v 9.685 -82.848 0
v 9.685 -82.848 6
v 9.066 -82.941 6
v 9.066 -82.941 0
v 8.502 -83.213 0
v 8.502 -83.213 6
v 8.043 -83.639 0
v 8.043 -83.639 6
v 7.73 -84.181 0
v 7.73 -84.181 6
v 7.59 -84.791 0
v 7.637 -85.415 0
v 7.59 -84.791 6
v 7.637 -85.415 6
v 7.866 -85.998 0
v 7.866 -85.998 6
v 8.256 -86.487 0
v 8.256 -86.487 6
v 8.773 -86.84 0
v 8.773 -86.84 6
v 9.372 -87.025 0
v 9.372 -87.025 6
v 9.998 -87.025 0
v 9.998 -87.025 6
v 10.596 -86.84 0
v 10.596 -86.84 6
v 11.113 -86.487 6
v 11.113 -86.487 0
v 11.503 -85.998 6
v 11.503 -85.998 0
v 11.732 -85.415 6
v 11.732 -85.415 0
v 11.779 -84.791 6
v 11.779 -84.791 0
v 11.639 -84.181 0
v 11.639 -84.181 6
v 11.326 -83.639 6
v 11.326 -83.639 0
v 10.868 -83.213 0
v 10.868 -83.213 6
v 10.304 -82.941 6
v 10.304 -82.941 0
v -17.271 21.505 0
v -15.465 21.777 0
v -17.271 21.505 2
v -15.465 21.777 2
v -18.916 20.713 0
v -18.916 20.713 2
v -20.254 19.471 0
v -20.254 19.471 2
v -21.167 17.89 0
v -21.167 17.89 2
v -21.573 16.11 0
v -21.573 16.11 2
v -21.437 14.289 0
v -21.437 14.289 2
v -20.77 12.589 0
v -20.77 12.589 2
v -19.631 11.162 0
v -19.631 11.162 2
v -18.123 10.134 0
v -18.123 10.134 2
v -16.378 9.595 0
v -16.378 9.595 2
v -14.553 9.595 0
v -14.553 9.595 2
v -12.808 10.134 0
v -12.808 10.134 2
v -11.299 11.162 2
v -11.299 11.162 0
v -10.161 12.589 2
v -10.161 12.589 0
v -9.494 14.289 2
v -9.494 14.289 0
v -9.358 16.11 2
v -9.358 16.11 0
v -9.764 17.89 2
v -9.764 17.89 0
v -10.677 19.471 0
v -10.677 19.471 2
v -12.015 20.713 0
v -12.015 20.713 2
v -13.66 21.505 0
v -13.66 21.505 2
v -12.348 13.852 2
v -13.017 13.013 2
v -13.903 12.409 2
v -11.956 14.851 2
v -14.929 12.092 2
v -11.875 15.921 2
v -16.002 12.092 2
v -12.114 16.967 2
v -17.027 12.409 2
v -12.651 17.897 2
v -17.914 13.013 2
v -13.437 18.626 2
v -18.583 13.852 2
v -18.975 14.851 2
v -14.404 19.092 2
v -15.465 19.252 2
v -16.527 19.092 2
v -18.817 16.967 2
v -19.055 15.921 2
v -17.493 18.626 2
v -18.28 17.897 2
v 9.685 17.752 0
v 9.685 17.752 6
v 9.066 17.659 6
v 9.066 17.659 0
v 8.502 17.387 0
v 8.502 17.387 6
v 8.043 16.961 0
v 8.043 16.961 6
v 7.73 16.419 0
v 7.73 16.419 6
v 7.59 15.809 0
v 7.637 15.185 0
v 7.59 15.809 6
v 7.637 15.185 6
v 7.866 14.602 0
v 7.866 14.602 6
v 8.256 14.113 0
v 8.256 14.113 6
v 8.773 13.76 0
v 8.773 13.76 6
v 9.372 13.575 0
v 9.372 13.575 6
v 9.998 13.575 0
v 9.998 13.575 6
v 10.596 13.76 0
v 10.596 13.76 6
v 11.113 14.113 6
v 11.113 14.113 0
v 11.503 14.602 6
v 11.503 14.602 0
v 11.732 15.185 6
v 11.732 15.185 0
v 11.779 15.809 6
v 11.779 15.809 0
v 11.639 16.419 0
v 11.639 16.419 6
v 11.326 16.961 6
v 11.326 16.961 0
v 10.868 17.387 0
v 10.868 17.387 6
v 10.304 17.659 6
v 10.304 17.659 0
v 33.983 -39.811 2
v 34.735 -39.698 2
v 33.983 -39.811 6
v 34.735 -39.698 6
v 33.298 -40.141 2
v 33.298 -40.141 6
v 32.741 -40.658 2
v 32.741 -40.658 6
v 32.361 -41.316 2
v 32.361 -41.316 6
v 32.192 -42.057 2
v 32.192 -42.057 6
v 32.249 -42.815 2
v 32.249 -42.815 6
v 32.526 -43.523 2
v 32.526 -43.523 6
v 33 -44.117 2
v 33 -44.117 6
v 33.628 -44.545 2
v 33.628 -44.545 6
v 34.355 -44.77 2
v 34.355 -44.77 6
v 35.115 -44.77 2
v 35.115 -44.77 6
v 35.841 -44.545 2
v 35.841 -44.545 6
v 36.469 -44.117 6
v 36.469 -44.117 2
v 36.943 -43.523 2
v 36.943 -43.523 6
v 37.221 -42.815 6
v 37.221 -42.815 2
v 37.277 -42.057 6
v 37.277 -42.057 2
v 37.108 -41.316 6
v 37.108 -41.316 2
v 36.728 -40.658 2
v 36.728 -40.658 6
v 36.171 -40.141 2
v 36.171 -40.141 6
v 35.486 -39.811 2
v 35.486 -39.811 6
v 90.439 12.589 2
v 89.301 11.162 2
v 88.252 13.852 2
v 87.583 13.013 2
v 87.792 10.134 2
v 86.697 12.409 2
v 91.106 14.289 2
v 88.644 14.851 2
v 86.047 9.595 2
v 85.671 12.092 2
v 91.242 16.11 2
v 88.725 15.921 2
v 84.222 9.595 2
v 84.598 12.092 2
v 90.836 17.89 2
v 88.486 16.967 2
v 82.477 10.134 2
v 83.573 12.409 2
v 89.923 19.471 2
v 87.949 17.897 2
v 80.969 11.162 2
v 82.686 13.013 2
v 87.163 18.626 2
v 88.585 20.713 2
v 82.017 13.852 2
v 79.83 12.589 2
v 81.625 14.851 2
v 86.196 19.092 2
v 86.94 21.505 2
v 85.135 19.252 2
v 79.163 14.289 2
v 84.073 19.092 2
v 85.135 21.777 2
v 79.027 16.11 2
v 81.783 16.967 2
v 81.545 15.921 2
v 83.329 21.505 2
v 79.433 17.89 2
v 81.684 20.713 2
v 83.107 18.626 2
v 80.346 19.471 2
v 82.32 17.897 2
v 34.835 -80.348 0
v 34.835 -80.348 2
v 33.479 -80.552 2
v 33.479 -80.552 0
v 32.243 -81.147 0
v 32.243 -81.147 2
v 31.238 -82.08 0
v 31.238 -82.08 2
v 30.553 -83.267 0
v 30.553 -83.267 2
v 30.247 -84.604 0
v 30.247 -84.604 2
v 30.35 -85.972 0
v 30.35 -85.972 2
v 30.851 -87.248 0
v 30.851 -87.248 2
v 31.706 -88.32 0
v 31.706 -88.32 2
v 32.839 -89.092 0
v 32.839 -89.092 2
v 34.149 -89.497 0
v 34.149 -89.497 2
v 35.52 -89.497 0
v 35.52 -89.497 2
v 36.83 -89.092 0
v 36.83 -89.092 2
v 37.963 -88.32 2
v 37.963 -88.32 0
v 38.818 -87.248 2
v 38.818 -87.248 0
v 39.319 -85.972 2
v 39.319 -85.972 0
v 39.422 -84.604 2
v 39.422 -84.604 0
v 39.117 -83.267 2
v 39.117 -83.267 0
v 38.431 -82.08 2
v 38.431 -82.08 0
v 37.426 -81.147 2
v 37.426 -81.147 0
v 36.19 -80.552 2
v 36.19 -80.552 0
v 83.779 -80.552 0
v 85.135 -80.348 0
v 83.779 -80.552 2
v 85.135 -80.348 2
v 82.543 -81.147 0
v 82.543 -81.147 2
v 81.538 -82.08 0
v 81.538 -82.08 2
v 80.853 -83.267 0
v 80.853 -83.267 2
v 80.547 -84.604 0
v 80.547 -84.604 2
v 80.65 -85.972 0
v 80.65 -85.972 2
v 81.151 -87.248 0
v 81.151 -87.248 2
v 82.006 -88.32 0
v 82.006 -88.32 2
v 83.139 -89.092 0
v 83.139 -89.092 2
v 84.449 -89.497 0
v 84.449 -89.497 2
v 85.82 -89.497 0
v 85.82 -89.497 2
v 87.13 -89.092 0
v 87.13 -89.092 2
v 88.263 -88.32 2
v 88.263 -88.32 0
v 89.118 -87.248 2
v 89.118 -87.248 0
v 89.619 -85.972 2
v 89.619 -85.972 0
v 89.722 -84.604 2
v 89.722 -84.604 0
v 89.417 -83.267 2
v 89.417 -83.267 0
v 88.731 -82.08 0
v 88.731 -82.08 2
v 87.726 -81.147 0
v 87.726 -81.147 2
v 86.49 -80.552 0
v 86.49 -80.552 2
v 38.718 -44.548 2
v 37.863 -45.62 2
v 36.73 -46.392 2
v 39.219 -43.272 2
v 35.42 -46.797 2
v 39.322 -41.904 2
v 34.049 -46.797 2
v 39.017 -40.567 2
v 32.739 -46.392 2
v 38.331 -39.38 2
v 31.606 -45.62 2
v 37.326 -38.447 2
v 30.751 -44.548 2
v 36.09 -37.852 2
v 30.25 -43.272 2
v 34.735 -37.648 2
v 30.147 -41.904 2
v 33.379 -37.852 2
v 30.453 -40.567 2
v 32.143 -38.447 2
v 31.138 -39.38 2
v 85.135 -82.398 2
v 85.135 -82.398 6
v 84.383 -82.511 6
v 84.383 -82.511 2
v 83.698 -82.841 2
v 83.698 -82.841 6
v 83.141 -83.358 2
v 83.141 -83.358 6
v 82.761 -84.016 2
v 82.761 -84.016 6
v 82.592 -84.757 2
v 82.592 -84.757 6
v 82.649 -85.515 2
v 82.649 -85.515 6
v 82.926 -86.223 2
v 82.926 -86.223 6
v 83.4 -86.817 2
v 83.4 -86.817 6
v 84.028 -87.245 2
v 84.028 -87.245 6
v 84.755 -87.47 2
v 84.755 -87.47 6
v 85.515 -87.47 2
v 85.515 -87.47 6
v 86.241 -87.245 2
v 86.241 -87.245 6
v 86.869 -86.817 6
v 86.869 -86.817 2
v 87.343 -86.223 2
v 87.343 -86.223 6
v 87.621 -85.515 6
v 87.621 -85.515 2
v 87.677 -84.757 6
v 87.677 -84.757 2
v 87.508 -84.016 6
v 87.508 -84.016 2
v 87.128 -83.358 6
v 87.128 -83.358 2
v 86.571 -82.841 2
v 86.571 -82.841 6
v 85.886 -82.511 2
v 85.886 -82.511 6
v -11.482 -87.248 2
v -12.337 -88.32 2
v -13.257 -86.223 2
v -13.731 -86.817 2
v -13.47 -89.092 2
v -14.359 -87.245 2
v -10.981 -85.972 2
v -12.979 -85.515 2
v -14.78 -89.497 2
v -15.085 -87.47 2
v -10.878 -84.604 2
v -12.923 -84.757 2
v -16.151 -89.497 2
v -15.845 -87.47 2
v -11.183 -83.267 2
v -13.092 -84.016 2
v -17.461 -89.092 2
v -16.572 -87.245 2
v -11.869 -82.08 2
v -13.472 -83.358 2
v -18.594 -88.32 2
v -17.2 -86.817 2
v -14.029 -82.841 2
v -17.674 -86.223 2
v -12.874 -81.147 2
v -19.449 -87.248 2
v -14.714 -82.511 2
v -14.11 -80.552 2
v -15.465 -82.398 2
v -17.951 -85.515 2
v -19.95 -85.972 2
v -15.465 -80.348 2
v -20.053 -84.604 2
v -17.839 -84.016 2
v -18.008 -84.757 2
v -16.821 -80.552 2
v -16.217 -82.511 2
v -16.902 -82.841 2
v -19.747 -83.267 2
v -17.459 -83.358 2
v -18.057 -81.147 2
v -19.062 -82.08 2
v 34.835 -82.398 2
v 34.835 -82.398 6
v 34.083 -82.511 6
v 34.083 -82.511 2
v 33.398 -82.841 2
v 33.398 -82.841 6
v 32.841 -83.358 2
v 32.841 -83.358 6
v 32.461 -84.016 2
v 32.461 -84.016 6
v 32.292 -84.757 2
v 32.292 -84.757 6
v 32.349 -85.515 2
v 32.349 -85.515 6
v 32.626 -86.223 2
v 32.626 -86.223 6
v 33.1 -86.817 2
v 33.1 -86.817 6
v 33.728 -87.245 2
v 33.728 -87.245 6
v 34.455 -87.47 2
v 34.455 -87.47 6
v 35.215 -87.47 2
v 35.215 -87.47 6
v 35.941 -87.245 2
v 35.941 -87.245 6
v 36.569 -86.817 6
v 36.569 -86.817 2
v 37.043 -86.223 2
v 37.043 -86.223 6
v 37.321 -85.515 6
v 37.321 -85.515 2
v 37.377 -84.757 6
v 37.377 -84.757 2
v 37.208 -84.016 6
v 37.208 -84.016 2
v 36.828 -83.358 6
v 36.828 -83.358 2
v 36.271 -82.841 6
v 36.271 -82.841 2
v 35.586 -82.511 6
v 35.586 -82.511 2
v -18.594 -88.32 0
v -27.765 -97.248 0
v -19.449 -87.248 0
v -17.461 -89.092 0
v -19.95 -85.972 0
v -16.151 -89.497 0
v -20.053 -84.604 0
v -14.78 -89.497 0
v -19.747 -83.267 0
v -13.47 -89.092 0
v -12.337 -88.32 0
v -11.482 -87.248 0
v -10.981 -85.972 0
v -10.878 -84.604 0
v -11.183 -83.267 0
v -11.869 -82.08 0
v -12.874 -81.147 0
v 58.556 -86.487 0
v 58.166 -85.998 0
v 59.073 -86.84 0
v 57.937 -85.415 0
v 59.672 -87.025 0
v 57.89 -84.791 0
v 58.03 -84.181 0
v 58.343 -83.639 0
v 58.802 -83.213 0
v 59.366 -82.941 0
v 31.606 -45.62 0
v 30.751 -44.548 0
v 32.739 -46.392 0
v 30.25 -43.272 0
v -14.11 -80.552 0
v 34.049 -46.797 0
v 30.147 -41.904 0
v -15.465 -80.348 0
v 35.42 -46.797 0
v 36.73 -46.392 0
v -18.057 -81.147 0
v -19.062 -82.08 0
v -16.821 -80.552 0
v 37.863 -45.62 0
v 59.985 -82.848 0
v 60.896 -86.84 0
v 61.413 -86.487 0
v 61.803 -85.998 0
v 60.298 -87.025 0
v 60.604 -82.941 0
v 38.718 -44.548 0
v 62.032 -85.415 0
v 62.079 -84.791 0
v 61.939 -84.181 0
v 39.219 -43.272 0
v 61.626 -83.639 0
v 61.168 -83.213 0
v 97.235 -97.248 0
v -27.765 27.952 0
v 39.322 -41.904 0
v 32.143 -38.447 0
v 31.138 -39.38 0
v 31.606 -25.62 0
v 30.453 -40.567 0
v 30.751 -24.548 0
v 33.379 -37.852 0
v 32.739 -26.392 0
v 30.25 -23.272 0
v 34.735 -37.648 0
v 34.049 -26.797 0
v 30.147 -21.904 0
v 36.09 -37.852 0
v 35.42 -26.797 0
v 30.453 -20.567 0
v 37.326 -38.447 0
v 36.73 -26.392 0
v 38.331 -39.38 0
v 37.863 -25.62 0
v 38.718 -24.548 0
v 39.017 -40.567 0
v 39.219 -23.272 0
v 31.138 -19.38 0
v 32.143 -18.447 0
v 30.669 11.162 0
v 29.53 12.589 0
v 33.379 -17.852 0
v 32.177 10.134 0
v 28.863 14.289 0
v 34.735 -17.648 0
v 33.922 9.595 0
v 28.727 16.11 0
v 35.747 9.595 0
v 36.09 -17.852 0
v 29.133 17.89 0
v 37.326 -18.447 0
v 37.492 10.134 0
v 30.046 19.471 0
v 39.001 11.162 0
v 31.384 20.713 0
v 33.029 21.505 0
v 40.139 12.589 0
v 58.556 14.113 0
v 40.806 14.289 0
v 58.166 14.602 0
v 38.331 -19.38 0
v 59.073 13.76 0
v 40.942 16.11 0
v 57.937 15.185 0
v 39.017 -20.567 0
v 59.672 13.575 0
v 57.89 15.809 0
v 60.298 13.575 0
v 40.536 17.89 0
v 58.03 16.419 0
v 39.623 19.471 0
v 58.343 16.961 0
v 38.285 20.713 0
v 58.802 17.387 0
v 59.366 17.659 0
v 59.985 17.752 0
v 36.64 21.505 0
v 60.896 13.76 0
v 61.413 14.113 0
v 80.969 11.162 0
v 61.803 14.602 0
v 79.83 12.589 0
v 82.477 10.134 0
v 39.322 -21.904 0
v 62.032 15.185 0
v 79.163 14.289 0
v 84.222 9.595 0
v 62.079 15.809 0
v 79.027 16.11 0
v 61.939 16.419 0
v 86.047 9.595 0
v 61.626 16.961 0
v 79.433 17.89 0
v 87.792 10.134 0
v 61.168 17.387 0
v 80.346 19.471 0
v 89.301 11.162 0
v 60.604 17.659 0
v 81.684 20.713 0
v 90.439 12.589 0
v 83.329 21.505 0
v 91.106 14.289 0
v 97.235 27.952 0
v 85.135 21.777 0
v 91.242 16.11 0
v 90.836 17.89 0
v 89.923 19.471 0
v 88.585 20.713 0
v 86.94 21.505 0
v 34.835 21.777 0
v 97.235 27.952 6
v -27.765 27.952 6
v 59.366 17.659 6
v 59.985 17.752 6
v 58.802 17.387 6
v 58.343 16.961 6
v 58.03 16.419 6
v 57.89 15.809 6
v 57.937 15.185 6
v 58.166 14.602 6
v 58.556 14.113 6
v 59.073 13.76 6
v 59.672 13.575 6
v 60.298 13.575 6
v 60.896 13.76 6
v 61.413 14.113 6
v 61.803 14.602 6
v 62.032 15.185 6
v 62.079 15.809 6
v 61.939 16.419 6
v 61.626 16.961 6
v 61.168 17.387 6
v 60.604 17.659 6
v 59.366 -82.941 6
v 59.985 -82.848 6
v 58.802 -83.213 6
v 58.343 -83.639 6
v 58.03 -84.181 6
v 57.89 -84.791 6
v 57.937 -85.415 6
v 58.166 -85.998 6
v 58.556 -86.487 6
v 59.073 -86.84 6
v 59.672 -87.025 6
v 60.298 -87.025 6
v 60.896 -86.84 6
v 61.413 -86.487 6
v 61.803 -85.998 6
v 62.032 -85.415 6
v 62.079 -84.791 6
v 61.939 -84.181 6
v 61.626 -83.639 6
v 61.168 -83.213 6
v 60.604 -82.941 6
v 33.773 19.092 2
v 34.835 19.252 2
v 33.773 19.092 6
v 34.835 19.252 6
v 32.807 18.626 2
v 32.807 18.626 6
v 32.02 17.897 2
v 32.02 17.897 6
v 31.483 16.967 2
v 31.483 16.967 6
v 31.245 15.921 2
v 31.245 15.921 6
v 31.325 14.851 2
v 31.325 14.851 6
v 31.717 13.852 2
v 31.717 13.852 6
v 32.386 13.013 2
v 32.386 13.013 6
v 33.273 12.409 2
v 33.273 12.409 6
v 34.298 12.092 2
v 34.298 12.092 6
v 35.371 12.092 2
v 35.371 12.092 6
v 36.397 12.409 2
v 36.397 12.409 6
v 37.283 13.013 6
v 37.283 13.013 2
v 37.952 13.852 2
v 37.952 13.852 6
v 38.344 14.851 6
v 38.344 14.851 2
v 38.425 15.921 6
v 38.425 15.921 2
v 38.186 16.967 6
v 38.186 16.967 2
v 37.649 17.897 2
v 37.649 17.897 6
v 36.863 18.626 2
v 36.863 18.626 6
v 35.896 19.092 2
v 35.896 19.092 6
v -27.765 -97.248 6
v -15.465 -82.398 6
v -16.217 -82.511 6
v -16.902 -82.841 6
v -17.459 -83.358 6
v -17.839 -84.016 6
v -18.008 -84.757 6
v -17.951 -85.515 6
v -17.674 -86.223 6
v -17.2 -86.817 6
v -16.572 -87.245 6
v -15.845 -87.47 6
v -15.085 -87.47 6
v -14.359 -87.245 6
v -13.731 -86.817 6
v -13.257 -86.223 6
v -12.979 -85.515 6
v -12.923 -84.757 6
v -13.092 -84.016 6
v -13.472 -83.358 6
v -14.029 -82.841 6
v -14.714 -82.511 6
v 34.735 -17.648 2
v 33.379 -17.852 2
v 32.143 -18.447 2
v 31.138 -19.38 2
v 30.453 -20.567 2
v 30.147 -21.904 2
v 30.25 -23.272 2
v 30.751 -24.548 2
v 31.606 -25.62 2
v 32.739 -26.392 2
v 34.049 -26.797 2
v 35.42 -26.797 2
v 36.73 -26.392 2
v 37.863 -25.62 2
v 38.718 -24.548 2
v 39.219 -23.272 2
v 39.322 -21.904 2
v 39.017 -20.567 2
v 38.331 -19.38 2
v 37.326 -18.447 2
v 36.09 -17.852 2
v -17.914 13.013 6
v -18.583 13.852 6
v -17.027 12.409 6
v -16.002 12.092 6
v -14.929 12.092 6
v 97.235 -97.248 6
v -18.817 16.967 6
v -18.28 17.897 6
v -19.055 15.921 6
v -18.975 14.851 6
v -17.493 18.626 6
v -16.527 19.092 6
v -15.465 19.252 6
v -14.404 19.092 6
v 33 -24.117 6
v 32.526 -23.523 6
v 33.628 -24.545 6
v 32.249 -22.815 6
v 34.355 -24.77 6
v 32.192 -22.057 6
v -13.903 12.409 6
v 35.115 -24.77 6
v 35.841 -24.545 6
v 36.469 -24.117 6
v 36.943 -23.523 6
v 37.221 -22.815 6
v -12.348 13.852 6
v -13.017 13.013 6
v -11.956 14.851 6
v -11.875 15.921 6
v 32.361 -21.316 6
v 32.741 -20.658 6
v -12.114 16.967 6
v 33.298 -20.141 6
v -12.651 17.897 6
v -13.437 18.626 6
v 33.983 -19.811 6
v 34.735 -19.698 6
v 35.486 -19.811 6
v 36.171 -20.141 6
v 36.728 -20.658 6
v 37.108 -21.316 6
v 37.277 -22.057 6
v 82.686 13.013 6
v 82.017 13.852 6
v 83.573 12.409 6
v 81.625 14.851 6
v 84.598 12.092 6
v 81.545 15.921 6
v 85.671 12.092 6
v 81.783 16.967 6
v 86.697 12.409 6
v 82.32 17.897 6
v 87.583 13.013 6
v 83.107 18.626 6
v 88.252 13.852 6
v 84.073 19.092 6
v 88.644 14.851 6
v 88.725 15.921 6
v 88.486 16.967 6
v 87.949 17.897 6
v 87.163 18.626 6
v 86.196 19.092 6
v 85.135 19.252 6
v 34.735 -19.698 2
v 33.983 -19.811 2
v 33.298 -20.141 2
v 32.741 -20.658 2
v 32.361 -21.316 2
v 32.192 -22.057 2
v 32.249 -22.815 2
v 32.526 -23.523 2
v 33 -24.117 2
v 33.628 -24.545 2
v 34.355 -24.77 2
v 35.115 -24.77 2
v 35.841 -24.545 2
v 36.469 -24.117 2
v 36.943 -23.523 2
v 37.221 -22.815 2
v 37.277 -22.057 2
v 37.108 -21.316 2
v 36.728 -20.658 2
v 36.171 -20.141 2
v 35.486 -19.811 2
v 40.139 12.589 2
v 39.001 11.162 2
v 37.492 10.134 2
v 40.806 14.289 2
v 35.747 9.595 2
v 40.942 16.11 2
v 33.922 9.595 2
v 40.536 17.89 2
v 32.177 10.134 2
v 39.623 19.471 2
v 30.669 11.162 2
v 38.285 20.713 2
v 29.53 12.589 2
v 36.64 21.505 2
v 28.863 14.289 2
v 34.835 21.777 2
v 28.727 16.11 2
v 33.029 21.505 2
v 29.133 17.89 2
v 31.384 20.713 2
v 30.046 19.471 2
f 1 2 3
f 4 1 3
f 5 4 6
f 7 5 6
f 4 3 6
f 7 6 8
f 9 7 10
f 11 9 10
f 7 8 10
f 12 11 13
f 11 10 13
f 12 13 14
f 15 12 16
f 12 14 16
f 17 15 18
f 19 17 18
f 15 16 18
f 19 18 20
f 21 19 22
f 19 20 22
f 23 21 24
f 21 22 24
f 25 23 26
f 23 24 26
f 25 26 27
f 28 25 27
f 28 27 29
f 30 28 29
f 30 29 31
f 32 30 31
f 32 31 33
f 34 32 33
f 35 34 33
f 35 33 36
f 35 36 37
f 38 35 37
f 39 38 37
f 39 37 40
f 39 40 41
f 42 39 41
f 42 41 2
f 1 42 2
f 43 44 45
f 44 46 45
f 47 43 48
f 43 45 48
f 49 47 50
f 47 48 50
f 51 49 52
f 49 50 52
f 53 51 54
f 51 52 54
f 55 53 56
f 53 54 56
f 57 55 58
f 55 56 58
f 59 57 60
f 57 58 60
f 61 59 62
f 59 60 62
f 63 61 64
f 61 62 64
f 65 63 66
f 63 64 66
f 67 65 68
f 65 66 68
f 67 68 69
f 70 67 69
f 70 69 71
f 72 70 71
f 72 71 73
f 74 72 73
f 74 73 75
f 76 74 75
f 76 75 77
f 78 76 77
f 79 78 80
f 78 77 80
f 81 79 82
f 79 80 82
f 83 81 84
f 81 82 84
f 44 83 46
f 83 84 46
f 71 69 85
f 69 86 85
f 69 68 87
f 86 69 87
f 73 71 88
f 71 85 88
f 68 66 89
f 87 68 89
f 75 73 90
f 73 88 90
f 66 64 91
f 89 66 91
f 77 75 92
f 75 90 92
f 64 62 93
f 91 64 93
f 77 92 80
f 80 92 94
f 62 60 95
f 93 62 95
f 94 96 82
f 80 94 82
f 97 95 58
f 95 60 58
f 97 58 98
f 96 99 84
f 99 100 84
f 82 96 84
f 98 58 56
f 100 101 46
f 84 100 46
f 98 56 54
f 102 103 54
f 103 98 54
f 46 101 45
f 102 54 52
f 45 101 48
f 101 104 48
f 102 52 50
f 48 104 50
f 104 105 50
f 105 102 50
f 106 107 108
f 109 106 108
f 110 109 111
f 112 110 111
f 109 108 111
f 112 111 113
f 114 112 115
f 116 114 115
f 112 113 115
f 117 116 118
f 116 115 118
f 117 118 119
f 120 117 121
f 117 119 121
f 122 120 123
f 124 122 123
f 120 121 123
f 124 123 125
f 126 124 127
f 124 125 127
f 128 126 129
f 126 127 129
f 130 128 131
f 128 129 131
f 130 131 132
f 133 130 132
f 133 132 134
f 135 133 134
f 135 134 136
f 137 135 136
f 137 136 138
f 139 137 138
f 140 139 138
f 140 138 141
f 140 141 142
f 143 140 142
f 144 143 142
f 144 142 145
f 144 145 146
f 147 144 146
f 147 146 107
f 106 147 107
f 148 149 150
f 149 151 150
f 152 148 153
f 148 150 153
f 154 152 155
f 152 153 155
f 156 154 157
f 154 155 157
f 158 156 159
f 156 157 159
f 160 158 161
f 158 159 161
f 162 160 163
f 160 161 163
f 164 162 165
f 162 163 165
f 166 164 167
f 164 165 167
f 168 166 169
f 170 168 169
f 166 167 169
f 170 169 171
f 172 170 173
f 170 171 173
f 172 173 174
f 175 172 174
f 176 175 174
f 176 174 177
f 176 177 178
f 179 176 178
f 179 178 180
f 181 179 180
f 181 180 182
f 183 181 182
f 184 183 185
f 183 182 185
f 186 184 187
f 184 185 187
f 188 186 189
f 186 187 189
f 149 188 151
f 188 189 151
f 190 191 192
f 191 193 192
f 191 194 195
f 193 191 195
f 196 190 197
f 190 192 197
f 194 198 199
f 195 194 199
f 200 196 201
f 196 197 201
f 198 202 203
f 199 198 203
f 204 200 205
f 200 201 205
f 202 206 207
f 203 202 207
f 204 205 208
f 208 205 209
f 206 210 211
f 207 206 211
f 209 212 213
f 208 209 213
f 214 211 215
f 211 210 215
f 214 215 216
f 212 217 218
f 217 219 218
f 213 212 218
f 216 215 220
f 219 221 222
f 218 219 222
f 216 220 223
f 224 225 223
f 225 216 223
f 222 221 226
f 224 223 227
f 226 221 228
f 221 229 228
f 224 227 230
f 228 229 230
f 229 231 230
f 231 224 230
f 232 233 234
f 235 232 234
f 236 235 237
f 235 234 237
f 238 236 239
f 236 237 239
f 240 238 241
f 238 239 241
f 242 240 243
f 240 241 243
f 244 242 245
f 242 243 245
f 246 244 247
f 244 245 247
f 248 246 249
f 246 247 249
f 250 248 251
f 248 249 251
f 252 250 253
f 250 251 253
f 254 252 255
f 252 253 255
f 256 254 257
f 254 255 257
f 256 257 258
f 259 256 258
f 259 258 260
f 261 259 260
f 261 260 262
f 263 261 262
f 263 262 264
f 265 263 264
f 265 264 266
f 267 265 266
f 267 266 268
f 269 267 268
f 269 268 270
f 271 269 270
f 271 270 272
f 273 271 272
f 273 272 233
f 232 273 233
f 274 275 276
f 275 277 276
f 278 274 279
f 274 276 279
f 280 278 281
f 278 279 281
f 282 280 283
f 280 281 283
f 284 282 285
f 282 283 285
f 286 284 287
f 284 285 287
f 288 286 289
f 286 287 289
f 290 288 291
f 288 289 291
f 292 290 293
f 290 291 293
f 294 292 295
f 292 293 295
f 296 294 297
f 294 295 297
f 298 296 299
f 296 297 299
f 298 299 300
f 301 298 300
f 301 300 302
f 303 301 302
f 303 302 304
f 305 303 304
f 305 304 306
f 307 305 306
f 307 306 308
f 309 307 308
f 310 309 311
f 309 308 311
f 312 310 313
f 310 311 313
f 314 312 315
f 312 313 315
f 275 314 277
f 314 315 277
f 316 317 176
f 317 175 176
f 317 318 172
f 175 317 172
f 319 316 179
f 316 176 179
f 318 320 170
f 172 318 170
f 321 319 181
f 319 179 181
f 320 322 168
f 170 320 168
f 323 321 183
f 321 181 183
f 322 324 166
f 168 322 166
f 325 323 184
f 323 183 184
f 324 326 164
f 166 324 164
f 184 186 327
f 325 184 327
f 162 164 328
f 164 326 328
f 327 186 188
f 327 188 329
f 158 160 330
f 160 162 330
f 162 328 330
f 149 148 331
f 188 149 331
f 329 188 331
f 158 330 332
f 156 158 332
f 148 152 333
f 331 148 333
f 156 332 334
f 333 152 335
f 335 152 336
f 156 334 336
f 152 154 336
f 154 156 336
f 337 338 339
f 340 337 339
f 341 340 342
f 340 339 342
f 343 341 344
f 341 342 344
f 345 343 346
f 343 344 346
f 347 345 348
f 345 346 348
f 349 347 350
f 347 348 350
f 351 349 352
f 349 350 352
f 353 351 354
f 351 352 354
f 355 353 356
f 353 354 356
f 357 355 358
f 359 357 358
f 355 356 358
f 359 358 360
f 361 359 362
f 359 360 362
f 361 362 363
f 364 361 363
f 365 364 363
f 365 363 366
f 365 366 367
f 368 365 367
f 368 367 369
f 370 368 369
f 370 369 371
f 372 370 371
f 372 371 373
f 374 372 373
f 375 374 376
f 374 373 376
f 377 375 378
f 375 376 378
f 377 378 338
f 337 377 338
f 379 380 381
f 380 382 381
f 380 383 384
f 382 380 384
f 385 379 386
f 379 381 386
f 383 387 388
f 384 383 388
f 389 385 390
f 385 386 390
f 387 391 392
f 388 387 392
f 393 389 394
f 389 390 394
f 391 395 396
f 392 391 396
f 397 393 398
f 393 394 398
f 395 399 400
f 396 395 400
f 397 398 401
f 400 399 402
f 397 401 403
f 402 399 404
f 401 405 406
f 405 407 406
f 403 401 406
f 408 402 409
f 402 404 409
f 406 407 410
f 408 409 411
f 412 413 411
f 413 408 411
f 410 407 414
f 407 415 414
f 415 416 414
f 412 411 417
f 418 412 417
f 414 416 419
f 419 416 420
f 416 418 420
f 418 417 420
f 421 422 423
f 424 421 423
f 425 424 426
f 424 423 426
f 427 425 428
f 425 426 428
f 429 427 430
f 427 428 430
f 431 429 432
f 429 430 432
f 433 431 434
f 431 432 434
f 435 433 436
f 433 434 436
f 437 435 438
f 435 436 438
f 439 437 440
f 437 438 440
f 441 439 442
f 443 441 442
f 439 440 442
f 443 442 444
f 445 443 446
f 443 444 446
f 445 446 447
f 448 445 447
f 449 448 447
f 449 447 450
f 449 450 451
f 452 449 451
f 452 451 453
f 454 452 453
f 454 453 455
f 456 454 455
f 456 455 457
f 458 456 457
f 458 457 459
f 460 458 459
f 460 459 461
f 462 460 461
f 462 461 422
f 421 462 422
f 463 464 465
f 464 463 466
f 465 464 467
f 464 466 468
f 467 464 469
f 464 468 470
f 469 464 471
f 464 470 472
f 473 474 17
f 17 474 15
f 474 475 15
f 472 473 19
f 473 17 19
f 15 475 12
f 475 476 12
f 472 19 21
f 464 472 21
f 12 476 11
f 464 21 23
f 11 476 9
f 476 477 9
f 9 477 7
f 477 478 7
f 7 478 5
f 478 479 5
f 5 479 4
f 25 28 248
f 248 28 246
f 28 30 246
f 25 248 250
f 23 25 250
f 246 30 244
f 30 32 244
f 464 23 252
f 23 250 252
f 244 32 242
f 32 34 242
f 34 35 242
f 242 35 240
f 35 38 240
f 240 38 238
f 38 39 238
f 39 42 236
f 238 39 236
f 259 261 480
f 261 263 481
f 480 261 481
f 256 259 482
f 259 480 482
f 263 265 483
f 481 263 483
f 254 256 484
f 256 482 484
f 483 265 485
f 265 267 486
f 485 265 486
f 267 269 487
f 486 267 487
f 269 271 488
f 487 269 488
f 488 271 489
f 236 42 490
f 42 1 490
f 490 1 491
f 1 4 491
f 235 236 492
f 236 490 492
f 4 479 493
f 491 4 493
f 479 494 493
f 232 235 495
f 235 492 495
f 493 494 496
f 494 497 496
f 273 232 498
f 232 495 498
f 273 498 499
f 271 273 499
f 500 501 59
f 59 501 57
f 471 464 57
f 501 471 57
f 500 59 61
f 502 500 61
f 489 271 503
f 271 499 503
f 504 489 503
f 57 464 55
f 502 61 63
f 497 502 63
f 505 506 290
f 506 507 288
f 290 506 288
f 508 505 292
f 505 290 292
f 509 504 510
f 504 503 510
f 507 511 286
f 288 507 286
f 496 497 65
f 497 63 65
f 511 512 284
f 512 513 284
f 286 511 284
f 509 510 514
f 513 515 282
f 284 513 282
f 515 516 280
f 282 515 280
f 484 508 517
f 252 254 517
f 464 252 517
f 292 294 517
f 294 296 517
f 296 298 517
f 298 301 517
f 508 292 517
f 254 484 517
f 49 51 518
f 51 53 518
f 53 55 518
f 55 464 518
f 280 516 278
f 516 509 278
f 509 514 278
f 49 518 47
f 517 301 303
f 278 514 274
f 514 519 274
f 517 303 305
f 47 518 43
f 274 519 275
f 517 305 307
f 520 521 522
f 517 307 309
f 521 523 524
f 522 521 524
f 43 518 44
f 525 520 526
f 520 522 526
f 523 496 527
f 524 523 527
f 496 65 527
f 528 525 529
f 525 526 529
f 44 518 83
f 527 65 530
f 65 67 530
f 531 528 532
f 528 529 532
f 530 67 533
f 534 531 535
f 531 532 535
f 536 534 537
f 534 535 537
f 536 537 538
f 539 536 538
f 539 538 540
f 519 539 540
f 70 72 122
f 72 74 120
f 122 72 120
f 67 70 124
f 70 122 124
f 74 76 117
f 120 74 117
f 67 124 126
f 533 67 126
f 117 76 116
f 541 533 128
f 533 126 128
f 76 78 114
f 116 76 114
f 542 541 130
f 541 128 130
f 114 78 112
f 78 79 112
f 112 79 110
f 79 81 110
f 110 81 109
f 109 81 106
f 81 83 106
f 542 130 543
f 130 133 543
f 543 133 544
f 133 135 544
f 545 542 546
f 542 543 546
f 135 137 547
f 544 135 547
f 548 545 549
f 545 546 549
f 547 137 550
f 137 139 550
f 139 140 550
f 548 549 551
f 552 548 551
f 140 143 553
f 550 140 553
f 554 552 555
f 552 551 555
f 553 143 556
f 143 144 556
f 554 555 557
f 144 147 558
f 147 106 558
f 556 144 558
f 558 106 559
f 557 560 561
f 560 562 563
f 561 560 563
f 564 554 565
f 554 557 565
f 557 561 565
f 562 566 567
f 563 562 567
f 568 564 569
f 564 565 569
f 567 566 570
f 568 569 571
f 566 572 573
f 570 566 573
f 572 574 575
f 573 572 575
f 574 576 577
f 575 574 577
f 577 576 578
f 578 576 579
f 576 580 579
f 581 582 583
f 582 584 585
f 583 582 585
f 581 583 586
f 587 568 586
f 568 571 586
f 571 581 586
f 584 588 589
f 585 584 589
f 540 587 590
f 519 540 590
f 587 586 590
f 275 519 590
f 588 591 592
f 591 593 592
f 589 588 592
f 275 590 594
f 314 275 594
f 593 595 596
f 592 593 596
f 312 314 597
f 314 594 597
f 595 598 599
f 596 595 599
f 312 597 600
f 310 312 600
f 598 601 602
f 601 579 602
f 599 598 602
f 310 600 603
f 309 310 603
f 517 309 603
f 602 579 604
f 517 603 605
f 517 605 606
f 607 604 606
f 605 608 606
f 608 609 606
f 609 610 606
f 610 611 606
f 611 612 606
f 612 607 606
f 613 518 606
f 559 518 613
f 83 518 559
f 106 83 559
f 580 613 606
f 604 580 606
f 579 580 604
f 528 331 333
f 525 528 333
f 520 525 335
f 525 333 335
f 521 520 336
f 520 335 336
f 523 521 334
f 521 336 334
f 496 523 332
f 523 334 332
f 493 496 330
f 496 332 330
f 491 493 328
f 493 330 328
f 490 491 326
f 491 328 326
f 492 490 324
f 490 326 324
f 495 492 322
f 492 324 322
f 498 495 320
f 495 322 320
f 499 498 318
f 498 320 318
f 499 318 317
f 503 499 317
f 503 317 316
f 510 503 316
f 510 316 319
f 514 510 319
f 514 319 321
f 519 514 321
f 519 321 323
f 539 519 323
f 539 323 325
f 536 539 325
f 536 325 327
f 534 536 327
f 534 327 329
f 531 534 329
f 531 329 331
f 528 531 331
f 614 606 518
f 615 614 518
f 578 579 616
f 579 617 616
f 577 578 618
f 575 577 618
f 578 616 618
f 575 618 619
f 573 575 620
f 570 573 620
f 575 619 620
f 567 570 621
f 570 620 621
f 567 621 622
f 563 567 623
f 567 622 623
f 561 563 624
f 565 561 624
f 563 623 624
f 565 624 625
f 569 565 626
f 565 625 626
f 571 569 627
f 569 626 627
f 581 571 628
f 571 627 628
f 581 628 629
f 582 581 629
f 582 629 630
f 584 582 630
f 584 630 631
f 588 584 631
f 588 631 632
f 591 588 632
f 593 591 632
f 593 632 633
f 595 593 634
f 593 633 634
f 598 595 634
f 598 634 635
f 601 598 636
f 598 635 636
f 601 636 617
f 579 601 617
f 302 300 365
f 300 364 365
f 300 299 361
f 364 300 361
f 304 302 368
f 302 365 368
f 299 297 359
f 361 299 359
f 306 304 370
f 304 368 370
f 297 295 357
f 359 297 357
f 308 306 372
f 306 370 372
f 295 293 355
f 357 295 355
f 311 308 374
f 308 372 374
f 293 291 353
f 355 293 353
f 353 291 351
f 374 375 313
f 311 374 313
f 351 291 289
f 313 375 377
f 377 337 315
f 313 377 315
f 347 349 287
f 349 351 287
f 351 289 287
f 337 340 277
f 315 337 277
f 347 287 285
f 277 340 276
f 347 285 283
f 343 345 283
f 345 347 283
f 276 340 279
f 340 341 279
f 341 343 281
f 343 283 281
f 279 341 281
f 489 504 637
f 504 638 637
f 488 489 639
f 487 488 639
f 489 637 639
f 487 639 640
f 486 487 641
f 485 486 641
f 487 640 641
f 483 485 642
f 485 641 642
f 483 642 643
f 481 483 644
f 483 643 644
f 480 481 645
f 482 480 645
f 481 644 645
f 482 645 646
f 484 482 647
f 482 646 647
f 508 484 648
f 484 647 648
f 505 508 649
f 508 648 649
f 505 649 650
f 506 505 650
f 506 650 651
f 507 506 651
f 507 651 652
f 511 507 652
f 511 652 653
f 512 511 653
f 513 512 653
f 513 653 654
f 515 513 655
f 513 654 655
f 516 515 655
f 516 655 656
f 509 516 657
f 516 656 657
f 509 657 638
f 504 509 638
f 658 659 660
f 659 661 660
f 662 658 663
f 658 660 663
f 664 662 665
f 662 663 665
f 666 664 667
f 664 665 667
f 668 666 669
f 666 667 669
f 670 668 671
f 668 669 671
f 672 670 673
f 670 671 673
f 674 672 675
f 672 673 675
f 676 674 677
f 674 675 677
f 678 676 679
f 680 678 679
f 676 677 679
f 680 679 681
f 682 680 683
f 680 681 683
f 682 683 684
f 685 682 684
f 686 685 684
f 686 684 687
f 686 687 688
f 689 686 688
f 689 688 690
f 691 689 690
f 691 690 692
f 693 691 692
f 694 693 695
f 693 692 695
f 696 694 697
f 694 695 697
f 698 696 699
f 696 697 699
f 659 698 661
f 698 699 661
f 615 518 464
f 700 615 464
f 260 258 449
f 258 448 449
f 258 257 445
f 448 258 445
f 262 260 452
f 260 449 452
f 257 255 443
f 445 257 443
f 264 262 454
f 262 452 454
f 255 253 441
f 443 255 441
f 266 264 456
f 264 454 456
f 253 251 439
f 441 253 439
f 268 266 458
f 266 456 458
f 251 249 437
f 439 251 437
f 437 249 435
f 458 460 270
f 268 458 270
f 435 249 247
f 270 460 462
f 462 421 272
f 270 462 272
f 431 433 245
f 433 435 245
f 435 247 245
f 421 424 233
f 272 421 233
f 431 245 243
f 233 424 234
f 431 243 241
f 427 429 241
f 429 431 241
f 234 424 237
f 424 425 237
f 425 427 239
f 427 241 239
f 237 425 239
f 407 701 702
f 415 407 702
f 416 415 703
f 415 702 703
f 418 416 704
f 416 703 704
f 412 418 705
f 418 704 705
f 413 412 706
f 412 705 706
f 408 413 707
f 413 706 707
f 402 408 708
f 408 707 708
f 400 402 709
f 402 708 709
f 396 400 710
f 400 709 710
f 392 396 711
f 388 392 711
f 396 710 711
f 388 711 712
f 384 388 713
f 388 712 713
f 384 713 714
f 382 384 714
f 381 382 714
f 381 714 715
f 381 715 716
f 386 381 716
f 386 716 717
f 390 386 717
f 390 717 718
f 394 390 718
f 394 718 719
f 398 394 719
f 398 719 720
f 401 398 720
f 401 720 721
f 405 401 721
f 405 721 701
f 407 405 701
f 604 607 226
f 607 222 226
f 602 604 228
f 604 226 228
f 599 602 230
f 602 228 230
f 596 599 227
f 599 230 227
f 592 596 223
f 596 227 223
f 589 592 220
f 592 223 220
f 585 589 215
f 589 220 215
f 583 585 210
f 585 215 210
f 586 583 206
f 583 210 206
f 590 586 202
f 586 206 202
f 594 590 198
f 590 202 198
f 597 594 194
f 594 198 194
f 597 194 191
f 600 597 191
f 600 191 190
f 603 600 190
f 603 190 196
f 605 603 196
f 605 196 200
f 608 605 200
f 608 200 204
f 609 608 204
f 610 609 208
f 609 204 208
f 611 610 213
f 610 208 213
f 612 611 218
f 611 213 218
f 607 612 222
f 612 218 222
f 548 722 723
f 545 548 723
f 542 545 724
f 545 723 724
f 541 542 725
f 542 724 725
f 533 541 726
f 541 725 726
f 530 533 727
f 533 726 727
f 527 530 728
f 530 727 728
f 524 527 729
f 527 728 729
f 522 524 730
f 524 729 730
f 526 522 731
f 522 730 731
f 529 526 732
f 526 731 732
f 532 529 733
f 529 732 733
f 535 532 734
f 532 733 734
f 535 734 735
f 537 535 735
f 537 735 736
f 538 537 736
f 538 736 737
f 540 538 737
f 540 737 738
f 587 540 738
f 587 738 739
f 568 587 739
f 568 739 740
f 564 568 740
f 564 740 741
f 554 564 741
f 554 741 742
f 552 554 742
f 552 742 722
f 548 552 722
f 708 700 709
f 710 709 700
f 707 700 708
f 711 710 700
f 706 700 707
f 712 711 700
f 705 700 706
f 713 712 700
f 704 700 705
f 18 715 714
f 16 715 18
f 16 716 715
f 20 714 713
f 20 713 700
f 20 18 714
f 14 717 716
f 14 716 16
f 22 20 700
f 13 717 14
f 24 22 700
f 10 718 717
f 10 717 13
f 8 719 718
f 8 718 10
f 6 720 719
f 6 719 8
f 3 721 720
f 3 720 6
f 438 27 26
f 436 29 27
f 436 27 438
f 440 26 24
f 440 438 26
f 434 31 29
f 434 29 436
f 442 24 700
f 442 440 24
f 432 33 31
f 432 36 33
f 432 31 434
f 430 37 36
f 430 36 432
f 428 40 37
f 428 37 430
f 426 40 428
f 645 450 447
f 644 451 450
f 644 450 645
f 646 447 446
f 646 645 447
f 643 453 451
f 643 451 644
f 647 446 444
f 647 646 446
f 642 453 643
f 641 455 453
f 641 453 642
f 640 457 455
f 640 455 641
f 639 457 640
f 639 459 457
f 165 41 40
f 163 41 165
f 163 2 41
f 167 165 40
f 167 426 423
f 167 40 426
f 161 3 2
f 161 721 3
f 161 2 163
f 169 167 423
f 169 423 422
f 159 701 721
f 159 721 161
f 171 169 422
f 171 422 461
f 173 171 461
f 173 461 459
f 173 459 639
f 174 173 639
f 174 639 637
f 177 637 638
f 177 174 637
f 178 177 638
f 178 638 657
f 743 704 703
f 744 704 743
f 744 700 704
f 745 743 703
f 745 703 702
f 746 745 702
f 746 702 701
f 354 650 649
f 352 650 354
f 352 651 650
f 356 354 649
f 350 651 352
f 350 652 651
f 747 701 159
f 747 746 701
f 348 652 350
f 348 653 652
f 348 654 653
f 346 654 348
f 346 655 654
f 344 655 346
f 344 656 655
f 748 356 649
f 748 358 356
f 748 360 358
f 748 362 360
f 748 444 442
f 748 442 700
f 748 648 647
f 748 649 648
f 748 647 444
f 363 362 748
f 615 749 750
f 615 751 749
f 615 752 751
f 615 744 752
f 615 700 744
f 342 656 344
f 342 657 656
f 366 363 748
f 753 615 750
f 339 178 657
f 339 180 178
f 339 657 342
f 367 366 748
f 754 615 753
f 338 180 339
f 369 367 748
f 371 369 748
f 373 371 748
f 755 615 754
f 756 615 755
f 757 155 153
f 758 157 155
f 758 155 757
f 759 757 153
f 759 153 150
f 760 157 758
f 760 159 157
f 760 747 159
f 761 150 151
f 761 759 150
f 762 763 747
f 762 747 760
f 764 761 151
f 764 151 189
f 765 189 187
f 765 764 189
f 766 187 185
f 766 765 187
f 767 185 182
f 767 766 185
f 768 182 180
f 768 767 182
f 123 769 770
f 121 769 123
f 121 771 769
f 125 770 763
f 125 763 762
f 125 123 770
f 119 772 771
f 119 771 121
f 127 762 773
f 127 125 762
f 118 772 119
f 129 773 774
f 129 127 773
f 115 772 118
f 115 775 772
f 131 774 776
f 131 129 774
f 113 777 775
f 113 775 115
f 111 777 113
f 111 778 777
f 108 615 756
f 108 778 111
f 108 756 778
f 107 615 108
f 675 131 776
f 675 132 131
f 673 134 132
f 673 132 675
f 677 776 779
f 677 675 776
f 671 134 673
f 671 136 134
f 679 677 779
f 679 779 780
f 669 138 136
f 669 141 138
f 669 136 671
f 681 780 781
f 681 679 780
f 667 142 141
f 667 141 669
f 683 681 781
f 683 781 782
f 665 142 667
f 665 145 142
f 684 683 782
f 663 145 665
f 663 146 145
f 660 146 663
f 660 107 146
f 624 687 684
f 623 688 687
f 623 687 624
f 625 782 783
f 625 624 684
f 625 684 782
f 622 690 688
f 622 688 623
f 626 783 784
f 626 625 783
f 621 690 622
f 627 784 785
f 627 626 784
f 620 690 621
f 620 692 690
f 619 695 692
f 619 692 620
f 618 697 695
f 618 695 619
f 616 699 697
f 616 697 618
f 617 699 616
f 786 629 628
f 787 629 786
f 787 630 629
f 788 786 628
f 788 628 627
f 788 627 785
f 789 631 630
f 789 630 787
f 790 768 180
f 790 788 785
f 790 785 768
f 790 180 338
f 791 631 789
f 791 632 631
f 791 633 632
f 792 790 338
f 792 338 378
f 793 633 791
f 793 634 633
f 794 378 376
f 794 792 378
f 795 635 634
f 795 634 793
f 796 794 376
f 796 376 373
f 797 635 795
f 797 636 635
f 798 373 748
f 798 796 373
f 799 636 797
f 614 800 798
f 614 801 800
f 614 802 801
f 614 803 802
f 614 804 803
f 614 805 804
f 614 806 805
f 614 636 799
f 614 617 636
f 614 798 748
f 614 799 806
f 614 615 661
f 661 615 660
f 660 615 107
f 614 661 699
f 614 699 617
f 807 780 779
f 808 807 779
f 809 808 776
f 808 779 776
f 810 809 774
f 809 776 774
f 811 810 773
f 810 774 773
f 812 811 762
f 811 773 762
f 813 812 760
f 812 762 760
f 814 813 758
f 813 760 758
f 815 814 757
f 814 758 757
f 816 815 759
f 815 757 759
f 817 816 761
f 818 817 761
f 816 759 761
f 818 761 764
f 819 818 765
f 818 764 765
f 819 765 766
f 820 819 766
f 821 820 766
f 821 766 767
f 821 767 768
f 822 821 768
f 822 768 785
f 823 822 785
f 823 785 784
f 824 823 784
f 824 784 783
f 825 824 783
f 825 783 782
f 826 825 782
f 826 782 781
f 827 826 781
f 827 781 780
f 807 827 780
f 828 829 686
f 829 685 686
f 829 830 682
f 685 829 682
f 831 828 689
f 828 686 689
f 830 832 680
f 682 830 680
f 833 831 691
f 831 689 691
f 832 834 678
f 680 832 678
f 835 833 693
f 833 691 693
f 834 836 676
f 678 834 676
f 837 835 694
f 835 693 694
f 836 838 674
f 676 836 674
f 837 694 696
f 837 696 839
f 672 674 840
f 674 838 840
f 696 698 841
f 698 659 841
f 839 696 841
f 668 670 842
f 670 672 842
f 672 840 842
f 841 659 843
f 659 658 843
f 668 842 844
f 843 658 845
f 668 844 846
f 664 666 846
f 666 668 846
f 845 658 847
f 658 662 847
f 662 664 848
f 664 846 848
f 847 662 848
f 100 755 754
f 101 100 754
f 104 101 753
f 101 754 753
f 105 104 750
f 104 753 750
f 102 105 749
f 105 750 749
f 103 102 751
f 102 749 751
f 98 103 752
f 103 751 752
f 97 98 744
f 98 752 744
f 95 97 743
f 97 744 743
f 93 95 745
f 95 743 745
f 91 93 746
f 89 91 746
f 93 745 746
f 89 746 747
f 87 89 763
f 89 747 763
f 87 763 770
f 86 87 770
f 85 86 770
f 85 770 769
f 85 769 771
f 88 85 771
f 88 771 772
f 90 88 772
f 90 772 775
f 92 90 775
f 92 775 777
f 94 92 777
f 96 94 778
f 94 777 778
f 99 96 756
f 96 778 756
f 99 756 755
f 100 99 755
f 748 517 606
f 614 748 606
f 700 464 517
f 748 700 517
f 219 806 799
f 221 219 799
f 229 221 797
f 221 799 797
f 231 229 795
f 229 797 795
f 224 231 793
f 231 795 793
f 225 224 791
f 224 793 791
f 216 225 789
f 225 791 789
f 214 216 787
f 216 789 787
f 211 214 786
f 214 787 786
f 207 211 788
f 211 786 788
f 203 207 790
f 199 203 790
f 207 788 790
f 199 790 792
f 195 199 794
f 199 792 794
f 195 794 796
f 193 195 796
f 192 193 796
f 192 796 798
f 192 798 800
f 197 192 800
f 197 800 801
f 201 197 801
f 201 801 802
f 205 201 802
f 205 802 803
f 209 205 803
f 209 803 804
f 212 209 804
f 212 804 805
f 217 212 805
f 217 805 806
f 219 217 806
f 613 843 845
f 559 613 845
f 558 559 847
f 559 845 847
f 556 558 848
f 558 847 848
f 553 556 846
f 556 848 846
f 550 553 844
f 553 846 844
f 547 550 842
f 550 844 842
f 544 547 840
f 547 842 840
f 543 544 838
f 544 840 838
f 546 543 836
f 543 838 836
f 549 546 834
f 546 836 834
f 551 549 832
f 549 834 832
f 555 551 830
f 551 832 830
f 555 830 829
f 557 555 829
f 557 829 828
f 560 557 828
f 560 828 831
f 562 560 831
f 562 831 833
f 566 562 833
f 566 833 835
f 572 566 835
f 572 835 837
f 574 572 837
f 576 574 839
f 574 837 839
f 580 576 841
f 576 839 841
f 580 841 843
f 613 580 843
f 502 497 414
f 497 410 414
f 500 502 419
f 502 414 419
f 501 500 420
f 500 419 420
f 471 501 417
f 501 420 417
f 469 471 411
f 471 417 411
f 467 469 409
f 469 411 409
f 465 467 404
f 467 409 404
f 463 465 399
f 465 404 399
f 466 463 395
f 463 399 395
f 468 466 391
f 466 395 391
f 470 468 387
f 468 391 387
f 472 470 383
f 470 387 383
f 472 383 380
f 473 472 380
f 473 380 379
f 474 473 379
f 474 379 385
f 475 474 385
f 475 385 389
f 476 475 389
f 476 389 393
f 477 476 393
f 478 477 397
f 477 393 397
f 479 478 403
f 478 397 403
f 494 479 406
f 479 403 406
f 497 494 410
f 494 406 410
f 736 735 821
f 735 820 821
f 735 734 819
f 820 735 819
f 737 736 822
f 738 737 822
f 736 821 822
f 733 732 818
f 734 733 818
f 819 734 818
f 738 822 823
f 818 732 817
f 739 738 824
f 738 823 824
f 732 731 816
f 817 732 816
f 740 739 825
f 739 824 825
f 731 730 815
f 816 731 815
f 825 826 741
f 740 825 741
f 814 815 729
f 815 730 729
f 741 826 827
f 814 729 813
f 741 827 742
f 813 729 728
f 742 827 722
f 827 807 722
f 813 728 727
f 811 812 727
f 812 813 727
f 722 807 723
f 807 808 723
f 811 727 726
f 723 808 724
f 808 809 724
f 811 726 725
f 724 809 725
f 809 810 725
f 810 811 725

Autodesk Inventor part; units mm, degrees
ref_plane "YZ Plane" through (0, 0, 0) normal (1, 0, 0) x (0, 1, 0)
ref_plane "XZ Plane" through (0, 0, 0) normal (0, 1, 0) x (-1, 0, 0)
ref_plane "XY Plane" through (0, 0, 0) normal (0, 0, 1) x (1, 0, 0)
sketch "Sketch1" plane through (0, 0, 0) normal (0, 0, 1) x (1, 0, 0)
  line L0 (97.2346, 27.952) -> (-27.7654, 27.952)
  line L1 (-27.7654, 27.952) -> (-27.7654, -97.248)
  line L2 (-27.7654, -97.248) -> (97.2346, -97.248)
  line L3 (97.2346, -97.248) -> (97.2346, 27.952)
  line L4 (85.1346, 27.952) -> (85.1346, -97.248) construction
  line L5 (-15.4654, 27.952) -> (-15.4654, -97.248) construction
  line L6 (-37.3152, 15.652) -> (117.1466, 15.652) construction
  line L7 (115.2487, -84.948) -> (-56.3615, -84.948) construction
  line L8 (34.8346, -156.7023) -> (34.8346, 57.8793) construction
  line L9 (59.9846, 68.2484) -> (59.9846, -132.2245) construction
  line L10 (9.6846, 55.4717) -> (9.6846, -128.574) construction
  point P0 (0, 0)
  point P1 (-65.7997, 171.2688)
  point P2 (85.1346, -84.948)
  point P3 (85.1346, 15.652)
  point P4 (-15.4654, 15.652)
  point P5 (-15.4654, -84.948)
  point P6 (34.8346, -84.948)
  point P7 (34.8346, 15.652)
  point P8 (59.9846, 15.652)
  point P9 (9.6846, 15.652)
  point P10 (59.9846, -84.948)
  point P11 (9.6846, -84.948)
  dimension "d0" = 125
  dimension "d1" = 125.2
  dimension "d6" = 100.6
  dimension "d48" = 12.3
  dimension "d49" = 100.6
  dimension "d50" = 50.3
  dimension "d72" = 25.15
  dimension "d73" = 25.15
extrude "Extrusion1" add sketch "Sketch1" along normal blind 6
hole "Hole6" at (85.1346, -84.948, 0) at (34.8346, -84.948, 0) at (-15.4654, -84.948, 0) direction (0, 0, 1) diameter 5.1 end through all counterbore diameter 9.2 counterbore depth 2
sketch "Sketch2" plane through (0, 0, 6) normal (0, 0, 1) x (1, 0, 0)
  line L0 (86.1945, -57.9789) -> (32.1694, -57.9789) construction
  line L1 (32.1694, -57.9789) -> (32.1694, -50.1092) construction
  line L2 (32.1694, -50.1092) -> (86.1945, -50.1092) construction
  line L3 (86.1945, -50.1092) -> (86.1945, -57.9789) construction
  point P0 (0, 0)
sketch "Sketch3" plane through (0, 0, 0) normal (0, 0, -1) x (-1, 0, 0)
  point P0 (0, 0)
hole "Hole7" at (85.1346, 15.652, 0) at (34.8346, 15.652, 0) at (-15.4654, 15.652, 0) direction (0, 0, 1) diameter 7.2 end through all counterbore diameter 12.25 counterbore depth 2
sketch "Sketch5" plane through (0, 0, 0) normal (0, 0, -1) x (-1, 0, 0)
  point P0 (0, 0)
  point P1 (-34.7346, -22.248)
  point P2 (-34.7346, -42.248)
hole "Hole8" at (34.7346, -22.248, 0) at (34.7346, -42.248, 0) direction (0, 0, 1) diameter 5.1 end through all counterbore diameter 9.2 counterbore depth 2
hole "Hole9" at (59.9846, 15.652, 0) at (9.6846, 15.652, 0) at (59.9846, -84.948, 0) at (9.6846, -84.948, 0) direction (0, 0, 1) diameter 4.2 end through all
equation "\"d72\" = 0.5 * d50"
equation "\"d73\" = 0.5 * d50"
properties part number "X axis carriage small_3DPrint"
